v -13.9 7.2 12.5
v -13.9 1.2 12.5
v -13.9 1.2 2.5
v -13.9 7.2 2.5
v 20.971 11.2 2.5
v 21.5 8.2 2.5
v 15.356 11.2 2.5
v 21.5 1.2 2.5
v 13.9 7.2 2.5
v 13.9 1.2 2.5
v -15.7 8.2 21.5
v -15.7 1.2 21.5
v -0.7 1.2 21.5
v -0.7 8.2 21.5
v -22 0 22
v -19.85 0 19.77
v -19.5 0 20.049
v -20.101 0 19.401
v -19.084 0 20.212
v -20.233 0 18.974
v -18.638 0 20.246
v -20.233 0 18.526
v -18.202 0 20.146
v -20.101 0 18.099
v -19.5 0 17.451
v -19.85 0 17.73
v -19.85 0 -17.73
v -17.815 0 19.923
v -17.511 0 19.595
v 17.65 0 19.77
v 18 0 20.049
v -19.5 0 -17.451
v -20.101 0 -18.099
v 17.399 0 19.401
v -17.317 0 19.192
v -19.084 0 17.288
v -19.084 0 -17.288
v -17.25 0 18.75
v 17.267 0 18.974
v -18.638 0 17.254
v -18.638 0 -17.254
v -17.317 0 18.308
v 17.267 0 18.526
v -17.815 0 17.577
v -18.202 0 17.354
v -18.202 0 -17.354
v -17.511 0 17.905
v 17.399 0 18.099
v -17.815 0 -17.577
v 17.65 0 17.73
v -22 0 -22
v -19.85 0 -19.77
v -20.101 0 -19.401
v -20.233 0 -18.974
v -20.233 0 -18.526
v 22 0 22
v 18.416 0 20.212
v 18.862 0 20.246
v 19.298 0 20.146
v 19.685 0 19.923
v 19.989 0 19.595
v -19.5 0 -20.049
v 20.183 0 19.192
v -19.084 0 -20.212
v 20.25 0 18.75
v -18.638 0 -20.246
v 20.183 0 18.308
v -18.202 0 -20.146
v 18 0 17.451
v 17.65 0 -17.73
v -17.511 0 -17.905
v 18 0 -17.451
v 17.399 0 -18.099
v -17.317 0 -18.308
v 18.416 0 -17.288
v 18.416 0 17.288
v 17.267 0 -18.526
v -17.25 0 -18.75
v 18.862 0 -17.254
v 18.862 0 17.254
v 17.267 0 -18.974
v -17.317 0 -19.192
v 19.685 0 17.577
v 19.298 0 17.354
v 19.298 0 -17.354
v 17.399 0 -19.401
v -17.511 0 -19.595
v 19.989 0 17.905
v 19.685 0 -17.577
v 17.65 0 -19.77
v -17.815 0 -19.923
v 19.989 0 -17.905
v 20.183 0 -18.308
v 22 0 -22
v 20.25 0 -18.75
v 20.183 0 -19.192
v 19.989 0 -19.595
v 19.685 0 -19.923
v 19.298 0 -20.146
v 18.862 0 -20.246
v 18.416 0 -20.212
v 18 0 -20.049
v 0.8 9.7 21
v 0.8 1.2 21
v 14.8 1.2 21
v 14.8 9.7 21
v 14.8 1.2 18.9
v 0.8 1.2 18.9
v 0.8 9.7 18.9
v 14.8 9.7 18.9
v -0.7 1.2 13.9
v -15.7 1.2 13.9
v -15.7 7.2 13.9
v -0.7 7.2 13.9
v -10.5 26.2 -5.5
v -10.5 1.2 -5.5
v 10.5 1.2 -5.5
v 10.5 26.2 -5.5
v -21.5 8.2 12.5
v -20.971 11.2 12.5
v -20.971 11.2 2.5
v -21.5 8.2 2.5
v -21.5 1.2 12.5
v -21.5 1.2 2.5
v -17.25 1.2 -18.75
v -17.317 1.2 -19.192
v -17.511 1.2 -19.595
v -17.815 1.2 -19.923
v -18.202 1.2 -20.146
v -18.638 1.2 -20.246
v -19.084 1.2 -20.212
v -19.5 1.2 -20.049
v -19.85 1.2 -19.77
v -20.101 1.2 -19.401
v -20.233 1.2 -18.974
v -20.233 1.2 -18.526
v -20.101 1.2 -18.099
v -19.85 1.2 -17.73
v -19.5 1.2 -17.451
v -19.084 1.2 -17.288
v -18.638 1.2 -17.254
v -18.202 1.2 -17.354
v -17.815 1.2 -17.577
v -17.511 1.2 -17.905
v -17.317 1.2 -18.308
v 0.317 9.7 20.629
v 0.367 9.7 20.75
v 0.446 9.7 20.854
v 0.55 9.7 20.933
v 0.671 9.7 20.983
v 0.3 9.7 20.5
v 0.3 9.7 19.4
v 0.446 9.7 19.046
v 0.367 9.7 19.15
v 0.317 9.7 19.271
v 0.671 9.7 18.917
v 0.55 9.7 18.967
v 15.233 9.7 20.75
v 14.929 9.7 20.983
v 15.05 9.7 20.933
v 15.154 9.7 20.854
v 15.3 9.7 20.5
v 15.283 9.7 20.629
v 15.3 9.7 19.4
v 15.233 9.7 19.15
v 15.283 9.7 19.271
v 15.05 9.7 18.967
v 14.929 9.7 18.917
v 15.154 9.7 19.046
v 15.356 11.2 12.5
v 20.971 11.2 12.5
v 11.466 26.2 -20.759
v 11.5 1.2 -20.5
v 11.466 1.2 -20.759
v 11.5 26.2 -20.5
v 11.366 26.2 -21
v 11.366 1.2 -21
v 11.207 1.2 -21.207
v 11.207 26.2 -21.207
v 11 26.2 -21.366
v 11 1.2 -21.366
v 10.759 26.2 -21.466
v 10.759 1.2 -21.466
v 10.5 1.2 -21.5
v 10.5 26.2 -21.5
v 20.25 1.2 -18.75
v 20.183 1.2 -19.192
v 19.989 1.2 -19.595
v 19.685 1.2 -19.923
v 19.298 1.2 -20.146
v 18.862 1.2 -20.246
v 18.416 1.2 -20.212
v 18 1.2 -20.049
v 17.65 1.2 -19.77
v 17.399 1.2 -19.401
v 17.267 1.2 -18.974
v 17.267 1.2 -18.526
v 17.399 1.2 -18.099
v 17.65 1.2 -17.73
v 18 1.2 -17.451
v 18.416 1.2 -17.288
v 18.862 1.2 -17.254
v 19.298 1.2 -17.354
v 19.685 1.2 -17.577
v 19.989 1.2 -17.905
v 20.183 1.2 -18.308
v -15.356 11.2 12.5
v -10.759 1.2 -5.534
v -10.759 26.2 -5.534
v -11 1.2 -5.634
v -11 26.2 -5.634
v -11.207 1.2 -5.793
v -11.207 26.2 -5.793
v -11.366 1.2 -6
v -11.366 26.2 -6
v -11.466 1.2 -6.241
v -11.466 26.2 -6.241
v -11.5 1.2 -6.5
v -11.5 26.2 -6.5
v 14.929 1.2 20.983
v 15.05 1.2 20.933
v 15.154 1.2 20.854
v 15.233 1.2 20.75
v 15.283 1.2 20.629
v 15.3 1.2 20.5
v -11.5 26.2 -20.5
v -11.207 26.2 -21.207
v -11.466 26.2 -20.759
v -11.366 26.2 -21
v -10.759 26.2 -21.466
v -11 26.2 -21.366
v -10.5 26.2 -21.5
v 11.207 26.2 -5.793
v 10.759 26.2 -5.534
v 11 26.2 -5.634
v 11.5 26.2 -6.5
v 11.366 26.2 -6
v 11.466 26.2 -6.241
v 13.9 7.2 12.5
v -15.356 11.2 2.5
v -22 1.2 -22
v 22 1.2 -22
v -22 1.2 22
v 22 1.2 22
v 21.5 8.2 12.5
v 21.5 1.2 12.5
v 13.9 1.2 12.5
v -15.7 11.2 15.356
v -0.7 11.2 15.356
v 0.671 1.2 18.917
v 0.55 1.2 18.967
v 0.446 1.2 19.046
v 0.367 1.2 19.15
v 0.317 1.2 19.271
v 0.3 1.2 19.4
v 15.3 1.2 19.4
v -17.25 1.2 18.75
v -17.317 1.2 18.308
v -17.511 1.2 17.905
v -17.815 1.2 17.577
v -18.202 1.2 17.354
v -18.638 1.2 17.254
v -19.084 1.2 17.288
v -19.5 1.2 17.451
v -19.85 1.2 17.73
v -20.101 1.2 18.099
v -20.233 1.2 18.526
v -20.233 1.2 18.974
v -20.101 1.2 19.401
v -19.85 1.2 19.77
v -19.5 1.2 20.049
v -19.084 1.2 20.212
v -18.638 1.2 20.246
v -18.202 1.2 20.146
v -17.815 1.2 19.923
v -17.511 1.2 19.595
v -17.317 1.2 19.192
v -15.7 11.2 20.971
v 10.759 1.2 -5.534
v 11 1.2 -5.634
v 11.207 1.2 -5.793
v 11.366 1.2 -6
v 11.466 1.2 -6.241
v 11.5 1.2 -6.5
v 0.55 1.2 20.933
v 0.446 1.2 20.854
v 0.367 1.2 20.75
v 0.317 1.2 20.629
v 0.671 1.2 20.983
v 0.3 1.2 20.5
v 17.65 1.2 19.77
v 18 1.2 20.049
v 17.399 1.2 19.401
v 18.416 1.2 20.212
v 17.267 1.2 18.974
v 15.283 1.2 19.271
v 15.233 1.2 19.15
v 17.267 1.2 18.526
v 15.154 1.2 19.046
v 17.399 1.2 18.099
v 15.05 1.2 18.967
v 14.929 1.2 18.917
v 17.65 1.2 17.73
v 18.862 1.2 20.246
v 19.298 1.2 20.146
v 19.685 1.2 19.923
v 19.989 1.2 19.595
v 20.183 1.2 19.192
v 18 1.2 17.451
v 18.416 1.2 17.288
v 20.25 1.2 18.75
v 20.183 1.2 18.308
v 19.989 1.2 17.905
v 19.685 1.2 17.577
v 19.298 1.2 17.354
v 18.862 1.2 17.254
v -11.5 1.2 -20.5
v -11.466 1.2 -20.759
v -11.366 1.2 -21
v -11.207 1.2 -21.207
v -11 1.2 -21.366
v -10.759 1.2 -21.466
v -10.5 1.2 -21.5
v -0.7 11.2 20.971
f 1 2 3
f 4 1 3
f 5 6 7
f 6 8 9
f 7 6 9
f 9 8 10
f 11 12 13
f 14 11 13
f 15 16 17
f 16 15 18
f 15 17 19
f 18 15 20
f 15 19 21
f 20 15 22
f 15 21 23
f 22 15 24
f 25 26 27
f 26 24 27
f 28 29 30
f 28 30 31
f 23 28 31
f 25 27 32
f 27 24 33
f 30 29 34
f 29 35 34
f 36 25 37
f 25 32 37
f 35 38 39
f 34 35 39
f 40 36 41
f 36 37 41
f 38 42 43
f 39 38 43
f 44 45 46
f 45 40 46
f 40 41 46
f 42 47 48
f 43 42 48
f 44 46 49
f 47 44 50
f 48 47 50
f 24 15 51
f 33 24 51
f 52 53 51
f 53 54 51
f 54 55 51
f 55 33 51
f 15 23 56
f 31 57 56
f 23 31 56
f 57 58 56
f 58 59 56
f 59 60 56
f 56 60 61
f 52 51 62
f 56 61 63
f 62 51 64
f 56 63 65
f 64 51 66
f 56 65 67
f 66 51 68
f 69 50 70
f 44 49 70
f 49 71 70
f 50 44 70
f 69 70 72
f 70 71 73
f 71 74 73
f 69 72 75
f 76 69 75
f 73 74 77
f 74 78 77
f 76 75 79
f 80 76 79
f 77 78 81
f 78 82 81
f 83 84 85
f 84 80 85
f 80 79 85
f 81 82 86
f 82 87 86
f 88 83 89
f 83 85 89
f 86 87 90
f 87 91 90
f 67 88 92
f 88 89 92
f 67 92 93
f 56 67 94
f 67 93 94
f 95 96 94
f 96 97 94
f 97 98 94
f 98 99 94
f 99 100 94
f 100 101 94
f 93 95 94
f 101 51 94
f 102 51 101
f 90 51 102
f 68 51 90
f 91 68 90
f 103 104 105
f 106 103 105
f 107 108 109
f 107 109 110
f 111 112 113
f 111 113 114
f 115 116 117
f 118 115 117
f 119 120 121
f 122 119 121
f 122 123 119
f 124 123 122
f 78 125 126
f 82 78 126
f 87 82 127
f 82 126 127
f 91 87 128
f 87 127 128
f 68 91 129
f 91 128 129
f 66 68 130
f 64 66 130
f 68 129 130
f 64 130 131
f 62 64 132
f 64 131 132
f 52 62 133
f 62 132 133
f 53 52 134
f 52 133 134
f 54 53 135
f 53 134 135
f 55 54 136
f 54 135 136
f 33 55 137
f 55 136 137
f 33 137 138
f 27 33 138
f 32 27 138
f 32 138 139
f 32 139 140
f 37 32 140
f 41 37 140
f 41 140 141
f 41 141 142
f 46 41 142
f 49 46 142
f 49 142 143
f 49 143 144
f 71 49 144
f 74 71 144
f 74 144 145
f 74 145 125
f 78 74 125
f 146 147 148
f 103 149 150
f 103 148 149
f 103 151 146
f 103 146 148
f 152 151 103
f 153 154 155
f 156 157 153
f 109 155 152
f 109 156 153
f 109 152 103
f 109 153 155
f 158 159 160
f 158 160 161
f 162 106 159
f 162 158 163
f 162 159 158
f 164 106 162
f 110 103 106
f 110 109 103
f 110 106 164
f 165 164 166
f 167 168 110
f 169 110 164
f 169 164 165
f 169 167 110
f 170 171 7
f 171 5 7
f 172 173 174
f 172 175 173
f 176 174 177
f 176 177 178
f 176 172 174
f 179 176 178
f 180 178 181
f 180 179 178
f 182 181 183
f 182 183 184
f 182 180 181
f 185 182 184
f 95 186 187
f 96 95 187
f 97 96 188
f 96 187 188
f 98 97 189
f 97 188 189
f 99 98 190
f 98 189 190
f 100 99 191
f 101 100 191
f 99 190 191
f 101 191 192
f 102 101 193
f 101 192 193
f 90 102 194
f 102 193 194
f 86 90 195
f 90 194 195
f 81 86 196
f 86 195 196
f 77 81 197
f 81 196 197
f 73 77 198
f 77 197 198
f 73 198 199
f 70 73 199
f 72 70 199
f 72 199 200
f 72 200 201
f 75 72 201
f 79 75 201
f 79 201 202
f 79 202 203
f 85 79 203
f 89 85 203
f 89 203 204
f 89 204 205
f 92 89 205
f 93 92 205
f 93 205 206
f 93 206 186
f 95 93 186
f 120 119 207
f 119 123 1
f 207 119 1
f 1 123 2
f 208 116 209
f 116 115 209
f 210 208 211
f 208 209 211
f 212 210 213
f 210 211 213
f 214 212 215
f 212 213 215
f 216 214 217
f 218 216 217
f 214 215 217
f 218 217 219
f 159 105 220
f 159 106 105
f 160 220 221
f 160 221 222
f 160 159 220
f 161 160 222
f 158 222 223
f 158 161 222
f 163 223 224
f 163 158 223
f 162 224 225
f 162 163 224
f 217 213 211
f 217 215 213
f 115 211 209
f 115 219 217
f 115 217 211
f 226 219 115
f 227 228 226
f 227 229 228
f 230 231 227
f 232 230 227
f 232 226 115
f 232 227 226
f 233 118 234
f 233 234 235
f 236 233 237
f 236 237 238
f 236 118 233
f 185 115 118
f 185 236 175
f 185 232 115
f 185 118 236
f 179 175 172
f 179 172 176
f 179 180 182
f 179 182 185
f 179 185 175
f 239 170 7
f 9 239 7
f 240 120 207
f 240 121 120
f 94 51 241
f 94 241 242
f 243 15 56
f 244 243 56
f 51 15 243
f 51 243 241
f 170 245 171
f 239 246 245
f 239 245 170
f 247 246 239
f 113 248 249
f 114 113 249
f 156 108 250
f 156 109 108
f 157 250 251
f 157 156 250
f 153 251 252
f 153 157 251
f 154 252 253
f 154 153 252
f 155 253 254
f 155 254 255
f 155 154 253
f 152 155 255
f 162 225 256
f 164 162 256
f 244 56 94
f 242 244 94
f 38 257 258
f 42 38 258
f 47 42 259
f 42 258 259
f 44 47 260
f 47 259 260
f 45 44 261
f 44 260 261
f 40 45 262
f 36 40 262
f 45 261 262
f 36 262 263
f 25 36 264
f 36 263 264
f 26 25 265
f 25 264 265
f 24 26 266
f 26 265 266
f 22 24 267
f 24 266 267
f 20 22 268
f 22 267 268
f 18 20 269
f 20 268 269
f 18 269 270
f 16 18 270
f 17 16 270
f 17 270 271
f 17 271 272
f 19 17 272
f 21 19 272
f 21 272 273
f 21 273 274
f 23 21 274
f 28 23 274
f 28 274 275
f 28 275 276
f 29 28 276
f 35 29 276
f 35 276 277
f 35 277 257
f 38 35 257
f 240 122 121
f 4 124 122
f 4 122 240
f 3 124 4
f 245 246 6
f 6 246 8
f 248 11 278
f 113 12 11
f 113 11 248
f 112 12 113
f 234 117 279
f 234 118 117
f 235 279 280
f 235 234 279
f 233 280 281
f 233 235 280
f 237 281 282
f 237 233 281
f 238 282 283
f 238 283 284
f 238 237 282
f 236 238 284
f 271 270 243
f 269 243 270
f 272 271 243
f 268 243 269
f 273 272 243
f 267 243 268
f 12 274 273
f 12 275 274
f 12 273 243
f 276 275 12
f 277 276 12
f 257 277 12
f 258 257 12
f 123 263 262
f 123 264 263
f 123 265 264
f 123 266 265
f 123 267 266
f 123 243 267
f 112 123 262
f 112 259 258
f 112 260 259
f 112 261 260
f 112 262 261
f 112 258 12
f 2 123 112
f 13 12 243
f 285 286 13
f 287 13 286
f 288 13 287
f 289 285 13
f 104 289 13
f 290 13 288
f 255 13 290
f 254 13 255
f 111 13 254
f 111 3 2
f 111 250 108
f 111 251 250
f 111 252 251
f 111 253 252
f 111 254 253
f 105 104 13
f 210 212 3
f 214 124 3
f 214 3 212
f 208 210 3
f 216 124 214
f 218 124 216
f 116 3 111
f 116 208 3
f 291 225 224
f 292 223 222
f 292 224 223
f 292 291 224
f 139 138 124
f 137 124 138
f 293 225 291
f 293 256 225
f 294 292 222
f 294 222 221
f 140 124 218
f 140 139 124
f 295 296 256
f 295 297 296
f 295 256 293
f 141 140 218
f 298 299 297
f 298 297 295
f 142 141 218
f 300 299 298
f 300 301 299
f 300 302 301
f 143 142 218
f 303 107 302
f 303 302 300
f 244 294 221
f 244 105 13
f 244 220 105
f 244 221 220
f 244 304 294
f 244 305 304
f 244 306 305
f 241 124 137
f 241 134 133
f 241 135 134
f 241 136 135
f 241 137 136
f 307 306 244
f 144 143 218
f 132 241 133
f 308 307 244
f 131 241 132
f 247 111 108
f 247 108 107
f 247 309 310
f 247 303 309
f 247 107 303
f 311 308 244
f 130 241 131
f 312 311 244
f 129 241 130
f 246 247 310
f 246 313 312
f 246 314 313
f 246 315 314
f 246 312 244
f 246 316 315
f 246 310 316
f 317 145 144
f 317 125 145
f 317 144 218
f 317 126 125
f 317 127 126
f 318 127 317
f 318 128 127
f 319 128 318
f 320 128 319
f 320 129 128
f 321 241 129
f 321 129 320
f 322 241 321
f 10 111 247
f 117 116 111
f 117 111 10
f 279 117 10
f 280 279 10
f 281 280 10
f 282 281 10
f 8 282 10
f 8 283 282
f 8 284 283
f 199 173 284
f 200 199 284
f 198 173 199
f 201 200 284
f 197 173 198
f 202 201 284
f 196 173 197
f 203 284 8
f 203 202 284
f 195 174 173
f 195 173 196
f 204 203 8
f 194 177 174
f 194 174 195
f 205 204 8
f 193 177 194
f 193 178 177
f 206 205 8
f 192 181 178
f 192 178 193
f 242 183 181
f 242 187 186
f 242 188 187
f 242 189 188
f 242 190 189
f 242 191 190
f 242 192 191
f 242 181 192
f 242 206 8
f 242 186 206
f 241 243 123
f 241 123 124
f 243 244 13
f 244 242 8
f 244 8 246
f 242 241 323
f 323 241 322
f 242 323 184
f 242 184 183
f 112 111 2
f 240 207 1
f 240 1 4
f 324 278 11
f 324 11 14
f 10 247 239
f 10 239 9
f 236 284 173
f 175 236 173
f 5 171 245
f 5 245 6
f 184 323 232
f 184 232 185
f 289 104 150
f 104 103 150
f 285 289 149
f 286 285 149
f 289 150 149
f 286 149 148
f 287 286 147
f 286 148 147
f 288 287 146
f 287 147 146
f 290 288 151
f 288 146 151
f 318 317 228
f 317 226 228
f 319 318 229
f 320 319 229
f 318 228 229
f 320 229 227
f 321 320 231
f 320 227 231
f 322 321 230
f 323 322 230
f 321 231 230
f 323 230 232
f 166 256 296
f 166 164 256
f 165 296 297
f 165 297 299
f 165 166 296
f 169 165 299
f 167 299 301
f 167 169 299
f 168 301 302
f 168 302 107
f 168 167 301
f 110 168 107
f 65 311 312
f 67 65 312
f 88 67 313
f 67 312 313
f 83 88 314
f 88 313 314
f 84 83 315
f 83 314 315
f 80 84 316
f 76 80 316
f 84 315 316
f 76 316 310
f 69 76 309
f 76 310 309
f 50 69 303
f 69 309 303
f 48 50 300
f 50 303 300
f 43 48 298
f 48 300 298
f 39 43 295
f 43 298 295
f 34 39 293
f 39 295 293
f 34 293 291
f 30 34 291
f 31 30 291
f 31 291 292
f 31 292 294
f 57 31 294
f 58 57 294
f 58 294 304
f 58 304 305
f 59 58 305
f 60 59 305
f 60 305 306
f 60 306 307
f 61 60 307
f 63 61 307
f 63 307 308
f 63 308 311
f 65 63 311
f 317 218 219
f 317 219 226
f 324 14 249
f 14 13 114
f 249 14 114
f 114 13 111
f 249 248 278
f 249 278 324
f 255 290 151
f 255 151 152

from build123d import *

# Parameters (mm, degrees)
SKETCH1_W             = 44
SKETCH1_H             = 44
BOSS_EXTRUDE1_DEPTH   = 1.2
SKETCH2_W             = 23
SKETCH2_H             = 16
BOSS_EXTRUDE2_DEPTH   = 25
SKETCH3_W             = 7.6
SKETCH3_H             = 10
BOSS_EXTRUDE3_DEPTH   = 10
FILLET1_R             = 1
SKETCH4_W             = 15
SKETCH4_H             = 7.6
BOSS_EXTRUDE4_DEPTH   = 10
CHAMFER2_SIZE         = 3
CHAMFER2_SIZE2        = 0.528980942
CHAMFER2_PART_2_SIZE  = 3
CHAMFER2_PART_2_SIZE2 = 0.528980942
CHAMFER2_PART_3_SIZE  = 3
CHAMFER2_PART_3_SIZE2 = 0.528980942
CHAMFER1_SIZE         = 4
CHAMFER1_SIZE2        = 1.455880937
CHAMFER1_PART_2_SIZE  = 4
CHAMFER1_PART_2_SIZE2 = 1.455880937
CHAMFER1_PART_3_SIZE  = 4
CHAMFER1_PART_3_SIZE2 = 1.455880937
SKETCH5_W             = 15
SKETCH5_H             = 2.1
BOSS_EXTRUDE5_DEPTH   = 8.5
FILLET2_R             = 0.5
SKETCH6_R             = 1.5
CUT_EXTRUDE1_DEPTH    = 2.2


with BuildPart() as part:
    # Sketch1 → Boss-Extrude1 (new body)
    with BuildSketch(Plane(origin=(0, 0, 0), x_dir=(1, 0, 0), z_dir=(0, 1, 0))):
        Rectangle(SKETCH1_W, SKETCH1_H)
    extrude(amount=BOSS_EXTRUDE1_DEPTH)

    # Sketch2 → Boss-Extrude2 (add)
    with BuildSketch(Plane(origin=(0, 1.2, 0), x_dir=(1, 0, 0), z_dir=(0, 1, 0))):
        with Locations((0, 13.5)):
            Rectangle(SKETCH2_W, SKETCH2_H)
    extrude(amount=BOSS_EXTRUDE2_DEPTH)

    # Sketch3 → Boss-Extrude3 (add)
    with BuildSketch(Plane(origin=(0, 1.2, 0), x_dir=(1, 0, 0), z_dir=(0, 1, 0))):
        with Locations((-17.7, -7.5)):
            Rectangle(SKETCH3_W, SKETCH3_H)
    boss_extrude3 = extrude(amount=BOSS_EXTRUDE3_DEPTH)

    # Mirror1: Boss-Extrude3 across plane
    add(boss_extrude3.mirror(Plane(origin=(0, 0, 0), x_dir=(0, 0, 1), z_dir=(1, 0, 0))))

    # Fillet1
    fillet1_edges = [part.edges().sort_by_distance(p)[0] for p in [
        (-11.5, 13.7, -21.5),
        (-11.5, 13.7, -5.5),
        (11.5, 13.7, -5.5),
        (11.5, 13.7, -21.5),
    ]]
    fillet(fillet1_edges, radius=FILLET1_R)

    # Sketch4 → Boss-Extrude4 (add)
    with BuildSketch(Plane(origin=(0, 1.2, 0), x_dir=(1, 0, 0), z_dir=(0, 1, 0))):
        with Locations((-8.2, -17.7)):
            Rectangle(SKETCH4_W, SKETCH4_H)
    extrude(amount=BOSS_EXTRUDE4_DEPTH)

    # Chamfer2
    chamfer2_edges = [part.edges().sort_by_distance(p)[0] for p in [
        (-21.5, 11.2, 7.5),
    ]]
    chamfer2_side = [part.faces().sort_by_distance(p)[0] for p in [
        (-21.5, 6.2, 7.5),
    ]]
    chamfer(chamfer2_edges, length=CHAMFER2_SIZE, length2=CHAMFER2_SIZE2, reference=chamfer2_side[0])

    # Chamfer2 part 2
    chamfer2_part_2_edges = [part.edges().sort_by_distance(p)[0] for p in [
        (21.5, 11.2, 7.5),
    ]]
    chamfer2_part_2_side = [part.faces().sort_by_distance(p)[0] for p in [
        (21.5, 6.2, 7.5),
    ]]
    chamfer(chamfer2_part_2_edges, length=CHAMFER2_PART_2_SIZE, length2=CHAMFER2_PART_2_SIZE2, reference=chamfer2_part_2_side[0])

    # Chamfer2 part 3
    chamfer2_part_3_edges = [part.edges().sort_by_distance(p)[0] for p in [
        (-8.2, 11.2, 21.5),
    ]]
    chamfer2_part_3_side = [part.faces().sort_by_distance(p)[0] for p in [
        (-8.2, 6.2, 21.5),
    ]]
    chamfer(chamfer2_part_3_edges, length=CHAMFER2_PART_3_SIZE, length2=CHAMFER2_PART_3_SIZE2, reference=chamfer2_part_3_side[0])

    # Chamfer1
    chamfer1_edges = [part.edges().sort_by_distance(p)[0] for p in [
        (-13.9, 11.2, 7.5),
    ]]
    chamfer1_side = [part.faces().sort_by_distance(p)[0] for p in [
        (-13.9, 6.2, 7.5),
    ]]
    chamfer(chamfer1_edges, length=CHAMFER1_SIZE, length2=CHAMFER1_SIZE2, reference=chamfer1_side[0])

    # Chamfer1 part 2
    chamfer1_part_2_edges = [part.edges().sort_by_distance(p)[0] for p in [
        (13.9, 11.2, 7.5),
    ]]
    chamfer1_part_2_side = [part.faces().sort_by_distance(p)[0] for p in [
        (13.9, 6.2, 7.5),
    ]]
    chamfer(chamfer1_part_2_edges, length=CHAMFER1_PART_2_SIZE, length2=CHAMFER1_PART_2_SIZE2, reference=chamfer1_part_2_side[0])

    # Chamfer1 part 3
    chamfer1_part_3_edges = [part.edges().sort_by_distance(p)[0] for p in [
        (-8.2, 11.2, 13.9),
    ]]
    chamfer1_part_3_side = [part.faces().sort_by_distance(p)[0] for p in [
        (-8.2, 6.2, 13.9),
    ]]
    chamfer(chamfer1_part_3_edges, length=CHAMFER1_PART_3_SIZE, length2=CHAMFER1_PART_3_SIZE2, reference=chamfer1_part_3_side[0])

    # Sketch5 → Boss-Extrude5 (add)
    with BuildSketch(Plane(origin=(0, 1.2, 0), x_dir=(1, 0, 0), z_dir=(0, 1, 0))):
        with Locations((7.8, -19.95)):
            Rectangle(SKETCH5_W, SKETCH5_H)
    extrude(amount=BOSS_EXTRUDE5_DEPTH)

    # Fillet2
    fillet2_edges = [part.edges().sort_by_distance(p)[0] for p in [
        (0.3, 5.45, 18.9),
        (0.3, 5.45, 21),
        (15.3, 5.45, 21),
        (15.3, 5.45, 18.9),
    ]]
    fillet(fillet2_edges, radius=FILLET2_R)

    # Sketch6 → Cut-Extrude1 (cut, through all)
    with BuildSketch(Plane(origin=(0, 1.2, 0), x_dir=(1, 0, 0), z_dir=(0, 1, 0))):
        with Locations((-18.75, 18.75)):
            Circle(SKETCH6_R)
        with Locations((18.75, 18.75)):
            Circle(SKETCH6_R)
        with Locations((18.75, -18.75)):
            Circle(SKETCH6_R)
        with Locations((-18.75, -18.75)):
            Circle(SKETCH6_R)
    extrude(amount=-CUT_EXTRUDE1_DEPTH, mode=Mode.SUBTRACT)


solid = part.part
